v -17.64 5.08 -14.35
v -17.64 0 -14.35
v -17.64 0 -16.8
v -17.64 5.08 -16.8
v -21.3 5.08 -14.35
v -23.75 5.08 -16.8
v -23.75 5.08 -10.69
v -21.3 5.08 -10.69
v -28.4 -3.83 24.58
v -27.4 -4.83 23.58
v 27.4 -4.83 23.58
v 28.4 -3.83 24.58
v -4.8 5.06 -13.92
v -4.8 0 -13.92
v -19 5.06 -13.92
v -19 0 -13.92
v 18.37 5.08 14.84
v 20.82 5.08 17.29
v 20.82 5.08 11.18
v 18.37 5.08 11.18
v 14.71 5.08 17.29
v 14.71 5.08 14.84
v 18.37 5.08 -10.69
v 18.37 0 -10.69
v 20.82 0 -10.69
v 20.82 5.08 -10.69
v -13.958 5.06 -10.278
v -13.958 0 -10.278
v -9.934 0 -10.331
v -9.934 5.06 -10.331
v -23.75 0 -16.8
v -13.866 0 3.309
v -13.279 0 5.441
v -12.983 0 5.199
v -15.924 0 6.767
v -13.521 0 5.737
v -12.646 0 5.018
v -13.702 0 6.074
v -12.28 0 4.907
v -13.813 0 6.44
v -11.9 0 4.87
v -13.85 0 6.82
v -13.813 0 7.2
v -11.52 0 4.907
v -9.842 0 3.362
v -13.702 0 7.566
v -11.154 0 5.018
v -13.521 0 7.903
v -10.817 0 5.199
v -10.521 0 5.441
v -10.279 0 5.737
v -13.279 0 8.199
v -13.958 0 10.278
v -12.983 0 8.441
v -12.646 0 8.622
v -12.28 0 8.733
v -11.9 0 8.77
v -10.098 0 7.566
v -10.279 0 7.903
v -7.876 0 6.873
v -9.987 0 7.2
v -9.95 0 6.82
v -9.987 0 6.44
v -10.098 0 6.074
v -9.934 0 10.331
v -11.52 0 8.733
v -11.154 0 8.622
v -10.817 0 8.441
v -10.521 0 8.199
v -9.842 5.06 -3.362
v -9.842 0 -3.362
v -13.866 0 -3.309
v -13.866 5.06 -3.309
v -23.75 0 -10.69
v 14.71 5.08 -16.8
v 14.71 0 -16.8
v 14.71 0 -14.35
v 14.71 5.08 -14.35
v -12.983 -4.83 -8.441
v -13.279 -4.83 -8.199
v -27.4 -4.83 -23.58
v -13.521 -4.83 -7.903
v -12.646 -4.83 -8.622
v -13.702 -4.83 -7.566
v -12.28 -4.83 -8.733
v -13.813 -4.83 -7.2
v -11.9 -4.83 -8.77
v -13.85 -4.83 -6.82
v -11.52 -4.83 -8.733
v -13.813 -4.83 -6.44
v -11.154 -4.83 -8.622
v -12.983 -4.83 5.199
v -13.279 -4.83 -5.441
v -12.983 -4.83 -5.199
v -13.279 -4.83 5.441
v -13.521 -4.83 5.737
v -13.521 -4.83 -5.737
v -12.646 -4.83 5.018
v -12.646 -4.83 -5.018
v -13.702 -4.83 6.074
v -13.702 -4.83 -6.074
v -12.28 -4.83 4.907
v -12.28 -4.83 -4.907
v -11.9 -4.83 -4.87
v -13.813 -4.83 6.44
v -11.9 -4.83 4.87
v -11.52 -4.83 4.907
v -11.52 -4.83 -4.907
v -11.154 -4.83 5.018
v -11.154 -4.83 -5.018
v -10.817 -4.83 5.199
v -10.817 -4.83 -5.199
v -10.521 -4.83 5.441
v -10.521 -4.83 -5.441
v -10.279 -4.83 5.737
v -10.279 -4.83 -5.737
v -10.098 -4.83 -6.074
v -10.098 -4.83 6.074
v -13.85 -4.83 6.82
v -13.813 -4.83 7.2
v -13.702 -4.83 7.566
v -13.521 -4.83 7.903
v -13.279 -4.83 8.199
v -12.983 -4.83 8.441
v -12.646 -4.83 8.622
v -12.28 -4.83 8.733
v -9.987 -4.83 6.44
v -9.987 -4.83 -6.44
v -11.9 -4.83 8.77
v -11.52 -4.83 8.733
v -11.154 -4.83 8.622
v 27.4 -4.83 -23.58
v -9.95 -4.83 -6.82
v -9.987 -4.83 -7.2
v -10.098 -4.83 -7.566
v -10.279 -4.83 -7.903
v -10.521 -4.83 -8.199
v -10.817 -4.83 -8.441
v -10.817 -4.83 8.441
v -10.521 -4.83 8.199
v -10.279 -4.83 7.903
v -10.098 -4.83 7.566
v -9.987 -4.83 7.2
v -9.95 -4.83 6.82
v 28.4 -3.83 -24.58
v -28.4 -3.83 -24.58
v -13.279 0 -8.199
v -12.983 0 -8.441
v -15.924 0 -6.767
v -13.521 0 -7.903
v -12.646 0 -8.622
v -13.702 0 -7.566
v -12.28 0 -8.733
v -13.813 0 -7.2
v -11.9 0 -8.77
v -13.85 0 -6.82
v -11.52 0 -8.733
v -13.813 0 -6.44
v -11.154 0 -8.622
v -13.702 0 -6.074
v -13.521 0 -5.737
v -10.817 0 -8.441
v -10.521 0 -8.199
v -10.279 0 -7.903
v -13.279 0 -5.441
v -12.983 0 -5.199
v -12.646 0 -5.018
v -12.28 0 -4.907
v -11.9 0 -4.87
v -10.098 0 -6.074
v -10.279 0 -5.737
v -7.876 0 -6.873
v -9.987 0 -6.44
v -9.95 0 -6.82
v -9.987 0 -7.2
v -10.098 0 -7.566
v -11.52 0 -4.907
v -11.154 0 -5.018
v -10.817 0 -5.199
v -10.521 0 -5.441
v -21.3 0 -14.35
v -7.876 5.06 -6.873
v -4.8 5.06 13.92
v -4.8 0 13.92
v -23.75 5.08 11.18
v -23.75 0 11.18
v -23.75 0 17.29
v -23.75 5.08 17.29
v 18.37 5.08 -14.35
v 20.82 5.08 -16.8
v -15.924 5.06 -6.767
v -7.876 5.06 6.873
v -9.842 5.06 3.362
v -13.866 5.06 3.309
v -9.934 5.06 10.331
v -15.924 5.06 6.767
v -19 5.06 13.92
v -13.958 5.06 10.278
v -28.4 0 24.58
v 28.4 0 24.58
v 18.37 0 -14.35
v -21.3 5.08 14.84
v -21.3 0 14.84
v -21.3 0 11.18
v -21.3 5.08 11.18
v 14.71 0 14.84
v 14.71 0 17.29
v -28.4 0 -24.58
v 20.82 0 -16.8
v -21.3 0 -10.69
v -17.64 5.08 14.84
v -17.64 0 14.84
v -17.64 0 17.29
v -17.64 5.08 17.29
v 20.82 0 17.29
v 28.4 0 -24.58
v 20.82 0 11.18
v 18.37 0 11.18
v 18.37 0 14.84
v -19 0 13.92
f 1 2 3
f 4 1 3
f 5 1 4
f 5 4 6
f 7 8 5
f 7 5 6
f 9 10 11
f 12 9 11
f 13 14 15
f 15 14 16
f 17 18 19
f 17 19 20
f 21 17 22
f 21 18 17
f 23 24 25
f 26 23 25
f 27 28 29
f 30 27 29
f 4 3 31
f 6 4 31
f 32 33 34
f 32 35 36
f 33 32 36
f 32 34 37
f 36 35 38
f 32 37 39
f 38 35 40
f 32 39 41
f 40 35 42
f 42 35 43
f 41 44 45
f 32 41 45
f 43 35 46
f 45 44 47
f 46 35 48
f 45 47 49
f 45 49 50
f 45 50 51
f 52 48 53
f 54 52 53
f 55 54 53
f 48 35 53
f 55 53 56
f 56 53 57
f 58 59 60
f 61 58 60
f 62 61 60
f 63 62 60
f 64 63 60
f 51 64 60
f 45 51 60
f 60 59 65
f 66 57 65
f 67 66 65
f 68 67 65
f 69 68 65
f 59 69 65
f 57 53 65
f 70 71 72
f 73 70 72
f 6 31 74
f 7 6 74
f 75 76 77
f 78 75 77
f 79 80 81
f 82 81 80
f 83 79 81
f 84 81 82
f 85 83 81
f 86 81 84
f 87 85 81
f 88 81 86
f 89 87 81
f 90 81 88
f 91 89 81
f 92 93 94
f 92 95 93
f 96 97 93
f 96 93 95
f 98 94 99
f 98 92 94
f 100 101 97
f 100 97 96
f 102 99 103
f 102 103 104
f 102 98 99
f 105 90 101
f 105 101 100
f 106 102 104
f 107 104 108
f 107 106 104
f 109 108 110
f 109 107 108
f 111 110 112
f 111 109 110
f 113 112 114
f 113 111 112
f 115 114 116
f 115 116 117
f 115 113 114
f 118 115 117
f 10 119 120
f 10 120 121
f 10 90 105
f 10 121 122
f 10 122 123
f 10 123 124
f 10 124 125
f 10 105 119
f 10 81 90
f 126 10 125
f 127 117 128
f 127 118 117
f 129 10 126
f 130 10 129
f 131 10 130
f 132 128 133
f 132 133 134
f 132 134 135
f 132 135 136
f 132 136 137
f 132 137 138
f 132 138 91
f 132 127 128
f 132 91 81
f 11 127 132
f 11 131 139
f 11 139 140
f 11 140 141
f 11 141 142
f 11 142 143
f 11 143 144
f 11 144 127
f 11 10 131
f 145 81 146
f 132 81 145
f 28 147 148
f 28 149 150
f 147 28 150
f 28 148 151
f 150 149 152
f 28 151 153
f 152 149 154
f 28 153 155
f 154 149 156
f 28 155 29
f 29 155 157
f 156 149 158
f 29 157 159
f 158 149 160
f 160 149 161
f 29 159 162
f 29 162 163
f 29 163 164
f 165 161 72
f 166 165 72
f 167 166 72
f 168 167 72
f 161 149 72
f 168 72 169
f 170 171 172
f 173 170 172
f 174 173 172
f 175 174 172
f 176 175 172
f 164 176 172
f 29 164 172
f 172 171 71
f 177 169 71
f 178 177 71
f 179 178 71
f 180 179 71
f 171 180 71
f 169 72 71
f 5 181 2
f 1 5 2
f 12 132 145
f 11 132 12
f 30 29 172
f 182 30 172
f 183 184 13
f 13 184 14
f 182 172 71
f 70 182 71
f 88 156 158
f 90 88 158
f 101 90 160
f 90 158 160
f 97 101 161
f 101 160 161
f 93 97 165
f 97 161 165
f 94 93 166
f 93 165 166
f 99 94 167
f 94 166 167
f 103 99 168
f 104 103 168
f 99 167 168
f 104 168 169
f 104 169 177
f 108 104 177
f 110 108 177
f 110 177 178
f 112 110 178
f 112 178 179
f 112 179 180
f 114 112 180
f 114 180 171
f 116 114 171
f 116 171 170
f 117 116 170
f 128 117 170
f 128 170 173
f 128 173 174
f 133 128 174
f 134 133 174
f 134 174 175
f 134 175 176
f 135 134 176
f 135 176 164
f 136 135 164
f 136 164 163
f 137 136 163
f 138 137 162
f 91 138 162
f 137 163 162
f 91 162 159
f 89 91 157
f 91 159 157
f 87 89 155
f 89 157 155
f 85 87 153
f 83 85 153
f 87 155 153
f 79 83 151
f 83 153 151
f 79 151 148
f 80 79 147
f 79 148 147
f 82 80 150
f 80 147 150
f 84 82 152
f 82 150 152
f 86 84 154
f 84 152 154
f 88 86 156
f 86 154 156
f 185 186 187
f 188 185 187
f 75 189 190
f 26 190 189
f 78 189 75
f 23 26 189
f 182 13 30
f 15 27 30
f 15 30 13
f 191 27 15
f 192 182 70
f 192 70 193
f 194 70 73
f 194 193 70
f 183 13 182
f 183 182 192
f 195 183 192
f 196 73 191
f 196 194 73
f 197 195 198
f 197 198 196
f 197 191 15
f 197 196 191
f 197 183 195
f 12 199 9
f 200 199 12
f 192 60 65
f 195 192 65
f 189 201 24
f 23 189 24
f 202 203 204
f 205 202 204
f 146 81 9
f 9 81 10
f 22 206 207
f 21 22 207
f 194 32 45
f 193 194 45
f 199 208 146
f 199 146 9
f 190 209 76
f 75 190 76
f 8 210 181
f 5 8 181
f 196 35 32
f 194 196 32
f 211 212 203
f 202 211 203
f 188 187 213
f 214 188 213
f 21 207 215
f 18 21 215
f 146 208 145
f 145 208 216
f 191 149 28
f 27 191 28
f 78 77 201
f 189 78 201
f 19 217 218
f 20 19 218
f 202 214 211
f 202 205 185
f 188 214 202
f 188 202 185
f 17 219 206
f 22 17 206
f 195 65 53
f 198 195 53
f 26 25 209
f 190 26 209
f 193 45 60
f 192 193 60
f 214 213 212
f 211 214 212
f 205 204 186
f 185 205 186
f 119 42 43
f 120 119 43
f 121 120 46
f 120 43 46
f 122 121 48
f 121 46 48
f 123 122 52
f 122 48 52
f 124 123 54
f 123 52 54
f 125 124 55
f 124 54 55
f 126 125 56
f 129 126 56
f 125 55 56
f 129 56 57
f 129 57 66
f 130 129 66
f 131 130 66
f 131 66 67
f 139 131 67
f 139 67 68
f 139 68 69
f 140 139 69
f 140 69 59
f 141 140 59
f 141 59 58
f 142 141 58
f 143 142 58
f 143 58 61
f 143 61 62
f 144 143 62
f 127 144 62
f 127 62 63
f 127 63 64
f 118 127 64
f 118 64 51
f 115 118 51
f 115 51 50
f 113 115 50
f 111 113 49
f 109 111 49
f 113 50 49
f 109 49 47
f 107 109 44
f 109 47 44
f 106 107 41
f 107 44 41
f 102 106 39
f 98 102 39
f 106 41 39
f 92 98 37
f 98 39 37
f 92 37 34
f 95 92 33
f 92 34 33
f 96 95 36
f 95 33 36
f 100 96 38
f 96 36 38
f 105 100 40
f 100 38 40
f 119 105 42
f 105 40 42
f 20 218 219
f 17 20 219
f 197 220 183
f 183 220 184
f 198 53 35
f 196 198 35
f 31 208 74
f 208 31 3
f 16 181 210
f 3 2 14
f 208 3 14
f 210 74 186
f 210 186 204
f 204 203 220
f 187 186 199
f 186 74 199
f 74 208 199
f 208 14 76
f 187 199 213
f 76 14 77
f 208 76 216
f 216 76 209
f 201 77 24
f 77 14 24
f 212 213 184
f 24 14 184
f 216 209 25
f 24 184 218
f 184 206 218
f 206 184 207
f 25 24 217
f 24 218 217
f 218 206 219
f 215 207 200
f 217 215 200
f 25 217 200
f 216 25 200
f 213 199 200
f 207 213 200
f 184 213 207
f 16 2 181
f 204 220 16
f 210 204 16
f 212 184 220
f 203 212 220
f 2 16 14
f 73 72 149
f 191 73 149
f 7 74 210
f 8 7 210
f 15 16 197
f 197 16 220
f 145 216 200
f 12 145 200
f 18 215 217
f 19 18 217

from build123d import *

# Parameters (mm, degrees)
F0_W     = 56.8
F0_H     = 49.16
F1_DEPTH = 4.83
F2_SIZE  = 1
F4_DEPTH = 5.08
F5_R     = 1.95
F6_DEPTH = 25
F5_W     = 14.2
F5_H     = 13.64
F7_DEPTH = 5.06


with BuildPart() as f1:
    # F0 (on Front) → F1 (new body)
    with BuildSketch(Plane.XZ):
        Rectangle(F0_W, F0_H)
    extrude(amount=F1_DEPTH)

    # F2
    f2_edges = [f1.edges().sort_by_distance(p)[0] for p in [
        (28.4, -4.83, 0),
        (0, -4.83, 24.58),
        (-28.4, -4.83, 0),
        (0, -4.83, -24.58),
    ]]
    chamfer(f2_edges, length=F2_SIZE)

    # F3 (on face) → F4 (join)
    with BuildSketch(Plane(origin=(0, 0, 0), x_dir=(-1, 0, 0), z_dir=(0, 1, 0))):
        Polygon((23.75, 17.29), (17.64, 17.29), (17.64, 14.84), (21.3, 14.84), (21.3, 11.18), (23.75, 11.18), align=None)
        Polygon((-18.37, -10.69), (-20.82, -10.69), (-20.82, -16.8), (-14.71, -16.8), (-14.71, -14.35), (-18.37, -14.35), align=None)
        Polygon((23.75, -16.8), (23.75, -10.69), (21.3, -10.69), (21.3, -14.35), (17.64, -14.35), (17.64, -16.8), align=None)
        Polygon((-14.71, 17.29), (-20.82, 17.29), (-20.82, 11.18), (-18.37, 11.18), (-18.37, 14.84), (-14.71, 14.84), align=None)
    extrude(amount=F4_DEPTH)

    # F5 (on face) → F6 (cut)
    with BuildSketch(Plane(origin=(0, 0, 0), x_dir=(-1, 0, 0), z_dir=(0, 1, 0))):
        with Locations((11.9, 6.82)):
            Circle(F5_R)
        with Locations((11.9, -6.82)):
            Circle(F5_R)
    extrude(amount=-F6_DEPTH, mode=Mode.SUBTRACT)

    # F5 (on face) → F7 (join)
    with BuildSketch(Plane(origin=(0, 0, 0), x_dir=(-1, 0, 0), z_dir=(0, 1, 0))):
        Polygon((19, 0.28), (19, 13.92), (4.8, 13.92), (4.8, 0.28), (4.8, -0.28), (19, -0.28), align=None)
        Polygon((13.957583, 10.278321), (15.923786, 6.767241), (13.866202, 3.30892), (9.842417, 3.361679), (7.876214, 6.872759), (9.933798, 10.33108), align=None, mode=Mode.SUBTRACT)
        with Locations((11.9, -7.1)):
            Rectangle(F5_W, F5_H)
        Polygon((9.933798, -10.33108), (7.876214, -6.872759), (9.842417, -3.361679), (13.866202, -3.30892), (15.923786, -6.767241), (13.957583, -10.278321), align=None, mode=Mode.SUBTRACT)
    extrude(amount=F7_DEPTH)


solid = f1.part
